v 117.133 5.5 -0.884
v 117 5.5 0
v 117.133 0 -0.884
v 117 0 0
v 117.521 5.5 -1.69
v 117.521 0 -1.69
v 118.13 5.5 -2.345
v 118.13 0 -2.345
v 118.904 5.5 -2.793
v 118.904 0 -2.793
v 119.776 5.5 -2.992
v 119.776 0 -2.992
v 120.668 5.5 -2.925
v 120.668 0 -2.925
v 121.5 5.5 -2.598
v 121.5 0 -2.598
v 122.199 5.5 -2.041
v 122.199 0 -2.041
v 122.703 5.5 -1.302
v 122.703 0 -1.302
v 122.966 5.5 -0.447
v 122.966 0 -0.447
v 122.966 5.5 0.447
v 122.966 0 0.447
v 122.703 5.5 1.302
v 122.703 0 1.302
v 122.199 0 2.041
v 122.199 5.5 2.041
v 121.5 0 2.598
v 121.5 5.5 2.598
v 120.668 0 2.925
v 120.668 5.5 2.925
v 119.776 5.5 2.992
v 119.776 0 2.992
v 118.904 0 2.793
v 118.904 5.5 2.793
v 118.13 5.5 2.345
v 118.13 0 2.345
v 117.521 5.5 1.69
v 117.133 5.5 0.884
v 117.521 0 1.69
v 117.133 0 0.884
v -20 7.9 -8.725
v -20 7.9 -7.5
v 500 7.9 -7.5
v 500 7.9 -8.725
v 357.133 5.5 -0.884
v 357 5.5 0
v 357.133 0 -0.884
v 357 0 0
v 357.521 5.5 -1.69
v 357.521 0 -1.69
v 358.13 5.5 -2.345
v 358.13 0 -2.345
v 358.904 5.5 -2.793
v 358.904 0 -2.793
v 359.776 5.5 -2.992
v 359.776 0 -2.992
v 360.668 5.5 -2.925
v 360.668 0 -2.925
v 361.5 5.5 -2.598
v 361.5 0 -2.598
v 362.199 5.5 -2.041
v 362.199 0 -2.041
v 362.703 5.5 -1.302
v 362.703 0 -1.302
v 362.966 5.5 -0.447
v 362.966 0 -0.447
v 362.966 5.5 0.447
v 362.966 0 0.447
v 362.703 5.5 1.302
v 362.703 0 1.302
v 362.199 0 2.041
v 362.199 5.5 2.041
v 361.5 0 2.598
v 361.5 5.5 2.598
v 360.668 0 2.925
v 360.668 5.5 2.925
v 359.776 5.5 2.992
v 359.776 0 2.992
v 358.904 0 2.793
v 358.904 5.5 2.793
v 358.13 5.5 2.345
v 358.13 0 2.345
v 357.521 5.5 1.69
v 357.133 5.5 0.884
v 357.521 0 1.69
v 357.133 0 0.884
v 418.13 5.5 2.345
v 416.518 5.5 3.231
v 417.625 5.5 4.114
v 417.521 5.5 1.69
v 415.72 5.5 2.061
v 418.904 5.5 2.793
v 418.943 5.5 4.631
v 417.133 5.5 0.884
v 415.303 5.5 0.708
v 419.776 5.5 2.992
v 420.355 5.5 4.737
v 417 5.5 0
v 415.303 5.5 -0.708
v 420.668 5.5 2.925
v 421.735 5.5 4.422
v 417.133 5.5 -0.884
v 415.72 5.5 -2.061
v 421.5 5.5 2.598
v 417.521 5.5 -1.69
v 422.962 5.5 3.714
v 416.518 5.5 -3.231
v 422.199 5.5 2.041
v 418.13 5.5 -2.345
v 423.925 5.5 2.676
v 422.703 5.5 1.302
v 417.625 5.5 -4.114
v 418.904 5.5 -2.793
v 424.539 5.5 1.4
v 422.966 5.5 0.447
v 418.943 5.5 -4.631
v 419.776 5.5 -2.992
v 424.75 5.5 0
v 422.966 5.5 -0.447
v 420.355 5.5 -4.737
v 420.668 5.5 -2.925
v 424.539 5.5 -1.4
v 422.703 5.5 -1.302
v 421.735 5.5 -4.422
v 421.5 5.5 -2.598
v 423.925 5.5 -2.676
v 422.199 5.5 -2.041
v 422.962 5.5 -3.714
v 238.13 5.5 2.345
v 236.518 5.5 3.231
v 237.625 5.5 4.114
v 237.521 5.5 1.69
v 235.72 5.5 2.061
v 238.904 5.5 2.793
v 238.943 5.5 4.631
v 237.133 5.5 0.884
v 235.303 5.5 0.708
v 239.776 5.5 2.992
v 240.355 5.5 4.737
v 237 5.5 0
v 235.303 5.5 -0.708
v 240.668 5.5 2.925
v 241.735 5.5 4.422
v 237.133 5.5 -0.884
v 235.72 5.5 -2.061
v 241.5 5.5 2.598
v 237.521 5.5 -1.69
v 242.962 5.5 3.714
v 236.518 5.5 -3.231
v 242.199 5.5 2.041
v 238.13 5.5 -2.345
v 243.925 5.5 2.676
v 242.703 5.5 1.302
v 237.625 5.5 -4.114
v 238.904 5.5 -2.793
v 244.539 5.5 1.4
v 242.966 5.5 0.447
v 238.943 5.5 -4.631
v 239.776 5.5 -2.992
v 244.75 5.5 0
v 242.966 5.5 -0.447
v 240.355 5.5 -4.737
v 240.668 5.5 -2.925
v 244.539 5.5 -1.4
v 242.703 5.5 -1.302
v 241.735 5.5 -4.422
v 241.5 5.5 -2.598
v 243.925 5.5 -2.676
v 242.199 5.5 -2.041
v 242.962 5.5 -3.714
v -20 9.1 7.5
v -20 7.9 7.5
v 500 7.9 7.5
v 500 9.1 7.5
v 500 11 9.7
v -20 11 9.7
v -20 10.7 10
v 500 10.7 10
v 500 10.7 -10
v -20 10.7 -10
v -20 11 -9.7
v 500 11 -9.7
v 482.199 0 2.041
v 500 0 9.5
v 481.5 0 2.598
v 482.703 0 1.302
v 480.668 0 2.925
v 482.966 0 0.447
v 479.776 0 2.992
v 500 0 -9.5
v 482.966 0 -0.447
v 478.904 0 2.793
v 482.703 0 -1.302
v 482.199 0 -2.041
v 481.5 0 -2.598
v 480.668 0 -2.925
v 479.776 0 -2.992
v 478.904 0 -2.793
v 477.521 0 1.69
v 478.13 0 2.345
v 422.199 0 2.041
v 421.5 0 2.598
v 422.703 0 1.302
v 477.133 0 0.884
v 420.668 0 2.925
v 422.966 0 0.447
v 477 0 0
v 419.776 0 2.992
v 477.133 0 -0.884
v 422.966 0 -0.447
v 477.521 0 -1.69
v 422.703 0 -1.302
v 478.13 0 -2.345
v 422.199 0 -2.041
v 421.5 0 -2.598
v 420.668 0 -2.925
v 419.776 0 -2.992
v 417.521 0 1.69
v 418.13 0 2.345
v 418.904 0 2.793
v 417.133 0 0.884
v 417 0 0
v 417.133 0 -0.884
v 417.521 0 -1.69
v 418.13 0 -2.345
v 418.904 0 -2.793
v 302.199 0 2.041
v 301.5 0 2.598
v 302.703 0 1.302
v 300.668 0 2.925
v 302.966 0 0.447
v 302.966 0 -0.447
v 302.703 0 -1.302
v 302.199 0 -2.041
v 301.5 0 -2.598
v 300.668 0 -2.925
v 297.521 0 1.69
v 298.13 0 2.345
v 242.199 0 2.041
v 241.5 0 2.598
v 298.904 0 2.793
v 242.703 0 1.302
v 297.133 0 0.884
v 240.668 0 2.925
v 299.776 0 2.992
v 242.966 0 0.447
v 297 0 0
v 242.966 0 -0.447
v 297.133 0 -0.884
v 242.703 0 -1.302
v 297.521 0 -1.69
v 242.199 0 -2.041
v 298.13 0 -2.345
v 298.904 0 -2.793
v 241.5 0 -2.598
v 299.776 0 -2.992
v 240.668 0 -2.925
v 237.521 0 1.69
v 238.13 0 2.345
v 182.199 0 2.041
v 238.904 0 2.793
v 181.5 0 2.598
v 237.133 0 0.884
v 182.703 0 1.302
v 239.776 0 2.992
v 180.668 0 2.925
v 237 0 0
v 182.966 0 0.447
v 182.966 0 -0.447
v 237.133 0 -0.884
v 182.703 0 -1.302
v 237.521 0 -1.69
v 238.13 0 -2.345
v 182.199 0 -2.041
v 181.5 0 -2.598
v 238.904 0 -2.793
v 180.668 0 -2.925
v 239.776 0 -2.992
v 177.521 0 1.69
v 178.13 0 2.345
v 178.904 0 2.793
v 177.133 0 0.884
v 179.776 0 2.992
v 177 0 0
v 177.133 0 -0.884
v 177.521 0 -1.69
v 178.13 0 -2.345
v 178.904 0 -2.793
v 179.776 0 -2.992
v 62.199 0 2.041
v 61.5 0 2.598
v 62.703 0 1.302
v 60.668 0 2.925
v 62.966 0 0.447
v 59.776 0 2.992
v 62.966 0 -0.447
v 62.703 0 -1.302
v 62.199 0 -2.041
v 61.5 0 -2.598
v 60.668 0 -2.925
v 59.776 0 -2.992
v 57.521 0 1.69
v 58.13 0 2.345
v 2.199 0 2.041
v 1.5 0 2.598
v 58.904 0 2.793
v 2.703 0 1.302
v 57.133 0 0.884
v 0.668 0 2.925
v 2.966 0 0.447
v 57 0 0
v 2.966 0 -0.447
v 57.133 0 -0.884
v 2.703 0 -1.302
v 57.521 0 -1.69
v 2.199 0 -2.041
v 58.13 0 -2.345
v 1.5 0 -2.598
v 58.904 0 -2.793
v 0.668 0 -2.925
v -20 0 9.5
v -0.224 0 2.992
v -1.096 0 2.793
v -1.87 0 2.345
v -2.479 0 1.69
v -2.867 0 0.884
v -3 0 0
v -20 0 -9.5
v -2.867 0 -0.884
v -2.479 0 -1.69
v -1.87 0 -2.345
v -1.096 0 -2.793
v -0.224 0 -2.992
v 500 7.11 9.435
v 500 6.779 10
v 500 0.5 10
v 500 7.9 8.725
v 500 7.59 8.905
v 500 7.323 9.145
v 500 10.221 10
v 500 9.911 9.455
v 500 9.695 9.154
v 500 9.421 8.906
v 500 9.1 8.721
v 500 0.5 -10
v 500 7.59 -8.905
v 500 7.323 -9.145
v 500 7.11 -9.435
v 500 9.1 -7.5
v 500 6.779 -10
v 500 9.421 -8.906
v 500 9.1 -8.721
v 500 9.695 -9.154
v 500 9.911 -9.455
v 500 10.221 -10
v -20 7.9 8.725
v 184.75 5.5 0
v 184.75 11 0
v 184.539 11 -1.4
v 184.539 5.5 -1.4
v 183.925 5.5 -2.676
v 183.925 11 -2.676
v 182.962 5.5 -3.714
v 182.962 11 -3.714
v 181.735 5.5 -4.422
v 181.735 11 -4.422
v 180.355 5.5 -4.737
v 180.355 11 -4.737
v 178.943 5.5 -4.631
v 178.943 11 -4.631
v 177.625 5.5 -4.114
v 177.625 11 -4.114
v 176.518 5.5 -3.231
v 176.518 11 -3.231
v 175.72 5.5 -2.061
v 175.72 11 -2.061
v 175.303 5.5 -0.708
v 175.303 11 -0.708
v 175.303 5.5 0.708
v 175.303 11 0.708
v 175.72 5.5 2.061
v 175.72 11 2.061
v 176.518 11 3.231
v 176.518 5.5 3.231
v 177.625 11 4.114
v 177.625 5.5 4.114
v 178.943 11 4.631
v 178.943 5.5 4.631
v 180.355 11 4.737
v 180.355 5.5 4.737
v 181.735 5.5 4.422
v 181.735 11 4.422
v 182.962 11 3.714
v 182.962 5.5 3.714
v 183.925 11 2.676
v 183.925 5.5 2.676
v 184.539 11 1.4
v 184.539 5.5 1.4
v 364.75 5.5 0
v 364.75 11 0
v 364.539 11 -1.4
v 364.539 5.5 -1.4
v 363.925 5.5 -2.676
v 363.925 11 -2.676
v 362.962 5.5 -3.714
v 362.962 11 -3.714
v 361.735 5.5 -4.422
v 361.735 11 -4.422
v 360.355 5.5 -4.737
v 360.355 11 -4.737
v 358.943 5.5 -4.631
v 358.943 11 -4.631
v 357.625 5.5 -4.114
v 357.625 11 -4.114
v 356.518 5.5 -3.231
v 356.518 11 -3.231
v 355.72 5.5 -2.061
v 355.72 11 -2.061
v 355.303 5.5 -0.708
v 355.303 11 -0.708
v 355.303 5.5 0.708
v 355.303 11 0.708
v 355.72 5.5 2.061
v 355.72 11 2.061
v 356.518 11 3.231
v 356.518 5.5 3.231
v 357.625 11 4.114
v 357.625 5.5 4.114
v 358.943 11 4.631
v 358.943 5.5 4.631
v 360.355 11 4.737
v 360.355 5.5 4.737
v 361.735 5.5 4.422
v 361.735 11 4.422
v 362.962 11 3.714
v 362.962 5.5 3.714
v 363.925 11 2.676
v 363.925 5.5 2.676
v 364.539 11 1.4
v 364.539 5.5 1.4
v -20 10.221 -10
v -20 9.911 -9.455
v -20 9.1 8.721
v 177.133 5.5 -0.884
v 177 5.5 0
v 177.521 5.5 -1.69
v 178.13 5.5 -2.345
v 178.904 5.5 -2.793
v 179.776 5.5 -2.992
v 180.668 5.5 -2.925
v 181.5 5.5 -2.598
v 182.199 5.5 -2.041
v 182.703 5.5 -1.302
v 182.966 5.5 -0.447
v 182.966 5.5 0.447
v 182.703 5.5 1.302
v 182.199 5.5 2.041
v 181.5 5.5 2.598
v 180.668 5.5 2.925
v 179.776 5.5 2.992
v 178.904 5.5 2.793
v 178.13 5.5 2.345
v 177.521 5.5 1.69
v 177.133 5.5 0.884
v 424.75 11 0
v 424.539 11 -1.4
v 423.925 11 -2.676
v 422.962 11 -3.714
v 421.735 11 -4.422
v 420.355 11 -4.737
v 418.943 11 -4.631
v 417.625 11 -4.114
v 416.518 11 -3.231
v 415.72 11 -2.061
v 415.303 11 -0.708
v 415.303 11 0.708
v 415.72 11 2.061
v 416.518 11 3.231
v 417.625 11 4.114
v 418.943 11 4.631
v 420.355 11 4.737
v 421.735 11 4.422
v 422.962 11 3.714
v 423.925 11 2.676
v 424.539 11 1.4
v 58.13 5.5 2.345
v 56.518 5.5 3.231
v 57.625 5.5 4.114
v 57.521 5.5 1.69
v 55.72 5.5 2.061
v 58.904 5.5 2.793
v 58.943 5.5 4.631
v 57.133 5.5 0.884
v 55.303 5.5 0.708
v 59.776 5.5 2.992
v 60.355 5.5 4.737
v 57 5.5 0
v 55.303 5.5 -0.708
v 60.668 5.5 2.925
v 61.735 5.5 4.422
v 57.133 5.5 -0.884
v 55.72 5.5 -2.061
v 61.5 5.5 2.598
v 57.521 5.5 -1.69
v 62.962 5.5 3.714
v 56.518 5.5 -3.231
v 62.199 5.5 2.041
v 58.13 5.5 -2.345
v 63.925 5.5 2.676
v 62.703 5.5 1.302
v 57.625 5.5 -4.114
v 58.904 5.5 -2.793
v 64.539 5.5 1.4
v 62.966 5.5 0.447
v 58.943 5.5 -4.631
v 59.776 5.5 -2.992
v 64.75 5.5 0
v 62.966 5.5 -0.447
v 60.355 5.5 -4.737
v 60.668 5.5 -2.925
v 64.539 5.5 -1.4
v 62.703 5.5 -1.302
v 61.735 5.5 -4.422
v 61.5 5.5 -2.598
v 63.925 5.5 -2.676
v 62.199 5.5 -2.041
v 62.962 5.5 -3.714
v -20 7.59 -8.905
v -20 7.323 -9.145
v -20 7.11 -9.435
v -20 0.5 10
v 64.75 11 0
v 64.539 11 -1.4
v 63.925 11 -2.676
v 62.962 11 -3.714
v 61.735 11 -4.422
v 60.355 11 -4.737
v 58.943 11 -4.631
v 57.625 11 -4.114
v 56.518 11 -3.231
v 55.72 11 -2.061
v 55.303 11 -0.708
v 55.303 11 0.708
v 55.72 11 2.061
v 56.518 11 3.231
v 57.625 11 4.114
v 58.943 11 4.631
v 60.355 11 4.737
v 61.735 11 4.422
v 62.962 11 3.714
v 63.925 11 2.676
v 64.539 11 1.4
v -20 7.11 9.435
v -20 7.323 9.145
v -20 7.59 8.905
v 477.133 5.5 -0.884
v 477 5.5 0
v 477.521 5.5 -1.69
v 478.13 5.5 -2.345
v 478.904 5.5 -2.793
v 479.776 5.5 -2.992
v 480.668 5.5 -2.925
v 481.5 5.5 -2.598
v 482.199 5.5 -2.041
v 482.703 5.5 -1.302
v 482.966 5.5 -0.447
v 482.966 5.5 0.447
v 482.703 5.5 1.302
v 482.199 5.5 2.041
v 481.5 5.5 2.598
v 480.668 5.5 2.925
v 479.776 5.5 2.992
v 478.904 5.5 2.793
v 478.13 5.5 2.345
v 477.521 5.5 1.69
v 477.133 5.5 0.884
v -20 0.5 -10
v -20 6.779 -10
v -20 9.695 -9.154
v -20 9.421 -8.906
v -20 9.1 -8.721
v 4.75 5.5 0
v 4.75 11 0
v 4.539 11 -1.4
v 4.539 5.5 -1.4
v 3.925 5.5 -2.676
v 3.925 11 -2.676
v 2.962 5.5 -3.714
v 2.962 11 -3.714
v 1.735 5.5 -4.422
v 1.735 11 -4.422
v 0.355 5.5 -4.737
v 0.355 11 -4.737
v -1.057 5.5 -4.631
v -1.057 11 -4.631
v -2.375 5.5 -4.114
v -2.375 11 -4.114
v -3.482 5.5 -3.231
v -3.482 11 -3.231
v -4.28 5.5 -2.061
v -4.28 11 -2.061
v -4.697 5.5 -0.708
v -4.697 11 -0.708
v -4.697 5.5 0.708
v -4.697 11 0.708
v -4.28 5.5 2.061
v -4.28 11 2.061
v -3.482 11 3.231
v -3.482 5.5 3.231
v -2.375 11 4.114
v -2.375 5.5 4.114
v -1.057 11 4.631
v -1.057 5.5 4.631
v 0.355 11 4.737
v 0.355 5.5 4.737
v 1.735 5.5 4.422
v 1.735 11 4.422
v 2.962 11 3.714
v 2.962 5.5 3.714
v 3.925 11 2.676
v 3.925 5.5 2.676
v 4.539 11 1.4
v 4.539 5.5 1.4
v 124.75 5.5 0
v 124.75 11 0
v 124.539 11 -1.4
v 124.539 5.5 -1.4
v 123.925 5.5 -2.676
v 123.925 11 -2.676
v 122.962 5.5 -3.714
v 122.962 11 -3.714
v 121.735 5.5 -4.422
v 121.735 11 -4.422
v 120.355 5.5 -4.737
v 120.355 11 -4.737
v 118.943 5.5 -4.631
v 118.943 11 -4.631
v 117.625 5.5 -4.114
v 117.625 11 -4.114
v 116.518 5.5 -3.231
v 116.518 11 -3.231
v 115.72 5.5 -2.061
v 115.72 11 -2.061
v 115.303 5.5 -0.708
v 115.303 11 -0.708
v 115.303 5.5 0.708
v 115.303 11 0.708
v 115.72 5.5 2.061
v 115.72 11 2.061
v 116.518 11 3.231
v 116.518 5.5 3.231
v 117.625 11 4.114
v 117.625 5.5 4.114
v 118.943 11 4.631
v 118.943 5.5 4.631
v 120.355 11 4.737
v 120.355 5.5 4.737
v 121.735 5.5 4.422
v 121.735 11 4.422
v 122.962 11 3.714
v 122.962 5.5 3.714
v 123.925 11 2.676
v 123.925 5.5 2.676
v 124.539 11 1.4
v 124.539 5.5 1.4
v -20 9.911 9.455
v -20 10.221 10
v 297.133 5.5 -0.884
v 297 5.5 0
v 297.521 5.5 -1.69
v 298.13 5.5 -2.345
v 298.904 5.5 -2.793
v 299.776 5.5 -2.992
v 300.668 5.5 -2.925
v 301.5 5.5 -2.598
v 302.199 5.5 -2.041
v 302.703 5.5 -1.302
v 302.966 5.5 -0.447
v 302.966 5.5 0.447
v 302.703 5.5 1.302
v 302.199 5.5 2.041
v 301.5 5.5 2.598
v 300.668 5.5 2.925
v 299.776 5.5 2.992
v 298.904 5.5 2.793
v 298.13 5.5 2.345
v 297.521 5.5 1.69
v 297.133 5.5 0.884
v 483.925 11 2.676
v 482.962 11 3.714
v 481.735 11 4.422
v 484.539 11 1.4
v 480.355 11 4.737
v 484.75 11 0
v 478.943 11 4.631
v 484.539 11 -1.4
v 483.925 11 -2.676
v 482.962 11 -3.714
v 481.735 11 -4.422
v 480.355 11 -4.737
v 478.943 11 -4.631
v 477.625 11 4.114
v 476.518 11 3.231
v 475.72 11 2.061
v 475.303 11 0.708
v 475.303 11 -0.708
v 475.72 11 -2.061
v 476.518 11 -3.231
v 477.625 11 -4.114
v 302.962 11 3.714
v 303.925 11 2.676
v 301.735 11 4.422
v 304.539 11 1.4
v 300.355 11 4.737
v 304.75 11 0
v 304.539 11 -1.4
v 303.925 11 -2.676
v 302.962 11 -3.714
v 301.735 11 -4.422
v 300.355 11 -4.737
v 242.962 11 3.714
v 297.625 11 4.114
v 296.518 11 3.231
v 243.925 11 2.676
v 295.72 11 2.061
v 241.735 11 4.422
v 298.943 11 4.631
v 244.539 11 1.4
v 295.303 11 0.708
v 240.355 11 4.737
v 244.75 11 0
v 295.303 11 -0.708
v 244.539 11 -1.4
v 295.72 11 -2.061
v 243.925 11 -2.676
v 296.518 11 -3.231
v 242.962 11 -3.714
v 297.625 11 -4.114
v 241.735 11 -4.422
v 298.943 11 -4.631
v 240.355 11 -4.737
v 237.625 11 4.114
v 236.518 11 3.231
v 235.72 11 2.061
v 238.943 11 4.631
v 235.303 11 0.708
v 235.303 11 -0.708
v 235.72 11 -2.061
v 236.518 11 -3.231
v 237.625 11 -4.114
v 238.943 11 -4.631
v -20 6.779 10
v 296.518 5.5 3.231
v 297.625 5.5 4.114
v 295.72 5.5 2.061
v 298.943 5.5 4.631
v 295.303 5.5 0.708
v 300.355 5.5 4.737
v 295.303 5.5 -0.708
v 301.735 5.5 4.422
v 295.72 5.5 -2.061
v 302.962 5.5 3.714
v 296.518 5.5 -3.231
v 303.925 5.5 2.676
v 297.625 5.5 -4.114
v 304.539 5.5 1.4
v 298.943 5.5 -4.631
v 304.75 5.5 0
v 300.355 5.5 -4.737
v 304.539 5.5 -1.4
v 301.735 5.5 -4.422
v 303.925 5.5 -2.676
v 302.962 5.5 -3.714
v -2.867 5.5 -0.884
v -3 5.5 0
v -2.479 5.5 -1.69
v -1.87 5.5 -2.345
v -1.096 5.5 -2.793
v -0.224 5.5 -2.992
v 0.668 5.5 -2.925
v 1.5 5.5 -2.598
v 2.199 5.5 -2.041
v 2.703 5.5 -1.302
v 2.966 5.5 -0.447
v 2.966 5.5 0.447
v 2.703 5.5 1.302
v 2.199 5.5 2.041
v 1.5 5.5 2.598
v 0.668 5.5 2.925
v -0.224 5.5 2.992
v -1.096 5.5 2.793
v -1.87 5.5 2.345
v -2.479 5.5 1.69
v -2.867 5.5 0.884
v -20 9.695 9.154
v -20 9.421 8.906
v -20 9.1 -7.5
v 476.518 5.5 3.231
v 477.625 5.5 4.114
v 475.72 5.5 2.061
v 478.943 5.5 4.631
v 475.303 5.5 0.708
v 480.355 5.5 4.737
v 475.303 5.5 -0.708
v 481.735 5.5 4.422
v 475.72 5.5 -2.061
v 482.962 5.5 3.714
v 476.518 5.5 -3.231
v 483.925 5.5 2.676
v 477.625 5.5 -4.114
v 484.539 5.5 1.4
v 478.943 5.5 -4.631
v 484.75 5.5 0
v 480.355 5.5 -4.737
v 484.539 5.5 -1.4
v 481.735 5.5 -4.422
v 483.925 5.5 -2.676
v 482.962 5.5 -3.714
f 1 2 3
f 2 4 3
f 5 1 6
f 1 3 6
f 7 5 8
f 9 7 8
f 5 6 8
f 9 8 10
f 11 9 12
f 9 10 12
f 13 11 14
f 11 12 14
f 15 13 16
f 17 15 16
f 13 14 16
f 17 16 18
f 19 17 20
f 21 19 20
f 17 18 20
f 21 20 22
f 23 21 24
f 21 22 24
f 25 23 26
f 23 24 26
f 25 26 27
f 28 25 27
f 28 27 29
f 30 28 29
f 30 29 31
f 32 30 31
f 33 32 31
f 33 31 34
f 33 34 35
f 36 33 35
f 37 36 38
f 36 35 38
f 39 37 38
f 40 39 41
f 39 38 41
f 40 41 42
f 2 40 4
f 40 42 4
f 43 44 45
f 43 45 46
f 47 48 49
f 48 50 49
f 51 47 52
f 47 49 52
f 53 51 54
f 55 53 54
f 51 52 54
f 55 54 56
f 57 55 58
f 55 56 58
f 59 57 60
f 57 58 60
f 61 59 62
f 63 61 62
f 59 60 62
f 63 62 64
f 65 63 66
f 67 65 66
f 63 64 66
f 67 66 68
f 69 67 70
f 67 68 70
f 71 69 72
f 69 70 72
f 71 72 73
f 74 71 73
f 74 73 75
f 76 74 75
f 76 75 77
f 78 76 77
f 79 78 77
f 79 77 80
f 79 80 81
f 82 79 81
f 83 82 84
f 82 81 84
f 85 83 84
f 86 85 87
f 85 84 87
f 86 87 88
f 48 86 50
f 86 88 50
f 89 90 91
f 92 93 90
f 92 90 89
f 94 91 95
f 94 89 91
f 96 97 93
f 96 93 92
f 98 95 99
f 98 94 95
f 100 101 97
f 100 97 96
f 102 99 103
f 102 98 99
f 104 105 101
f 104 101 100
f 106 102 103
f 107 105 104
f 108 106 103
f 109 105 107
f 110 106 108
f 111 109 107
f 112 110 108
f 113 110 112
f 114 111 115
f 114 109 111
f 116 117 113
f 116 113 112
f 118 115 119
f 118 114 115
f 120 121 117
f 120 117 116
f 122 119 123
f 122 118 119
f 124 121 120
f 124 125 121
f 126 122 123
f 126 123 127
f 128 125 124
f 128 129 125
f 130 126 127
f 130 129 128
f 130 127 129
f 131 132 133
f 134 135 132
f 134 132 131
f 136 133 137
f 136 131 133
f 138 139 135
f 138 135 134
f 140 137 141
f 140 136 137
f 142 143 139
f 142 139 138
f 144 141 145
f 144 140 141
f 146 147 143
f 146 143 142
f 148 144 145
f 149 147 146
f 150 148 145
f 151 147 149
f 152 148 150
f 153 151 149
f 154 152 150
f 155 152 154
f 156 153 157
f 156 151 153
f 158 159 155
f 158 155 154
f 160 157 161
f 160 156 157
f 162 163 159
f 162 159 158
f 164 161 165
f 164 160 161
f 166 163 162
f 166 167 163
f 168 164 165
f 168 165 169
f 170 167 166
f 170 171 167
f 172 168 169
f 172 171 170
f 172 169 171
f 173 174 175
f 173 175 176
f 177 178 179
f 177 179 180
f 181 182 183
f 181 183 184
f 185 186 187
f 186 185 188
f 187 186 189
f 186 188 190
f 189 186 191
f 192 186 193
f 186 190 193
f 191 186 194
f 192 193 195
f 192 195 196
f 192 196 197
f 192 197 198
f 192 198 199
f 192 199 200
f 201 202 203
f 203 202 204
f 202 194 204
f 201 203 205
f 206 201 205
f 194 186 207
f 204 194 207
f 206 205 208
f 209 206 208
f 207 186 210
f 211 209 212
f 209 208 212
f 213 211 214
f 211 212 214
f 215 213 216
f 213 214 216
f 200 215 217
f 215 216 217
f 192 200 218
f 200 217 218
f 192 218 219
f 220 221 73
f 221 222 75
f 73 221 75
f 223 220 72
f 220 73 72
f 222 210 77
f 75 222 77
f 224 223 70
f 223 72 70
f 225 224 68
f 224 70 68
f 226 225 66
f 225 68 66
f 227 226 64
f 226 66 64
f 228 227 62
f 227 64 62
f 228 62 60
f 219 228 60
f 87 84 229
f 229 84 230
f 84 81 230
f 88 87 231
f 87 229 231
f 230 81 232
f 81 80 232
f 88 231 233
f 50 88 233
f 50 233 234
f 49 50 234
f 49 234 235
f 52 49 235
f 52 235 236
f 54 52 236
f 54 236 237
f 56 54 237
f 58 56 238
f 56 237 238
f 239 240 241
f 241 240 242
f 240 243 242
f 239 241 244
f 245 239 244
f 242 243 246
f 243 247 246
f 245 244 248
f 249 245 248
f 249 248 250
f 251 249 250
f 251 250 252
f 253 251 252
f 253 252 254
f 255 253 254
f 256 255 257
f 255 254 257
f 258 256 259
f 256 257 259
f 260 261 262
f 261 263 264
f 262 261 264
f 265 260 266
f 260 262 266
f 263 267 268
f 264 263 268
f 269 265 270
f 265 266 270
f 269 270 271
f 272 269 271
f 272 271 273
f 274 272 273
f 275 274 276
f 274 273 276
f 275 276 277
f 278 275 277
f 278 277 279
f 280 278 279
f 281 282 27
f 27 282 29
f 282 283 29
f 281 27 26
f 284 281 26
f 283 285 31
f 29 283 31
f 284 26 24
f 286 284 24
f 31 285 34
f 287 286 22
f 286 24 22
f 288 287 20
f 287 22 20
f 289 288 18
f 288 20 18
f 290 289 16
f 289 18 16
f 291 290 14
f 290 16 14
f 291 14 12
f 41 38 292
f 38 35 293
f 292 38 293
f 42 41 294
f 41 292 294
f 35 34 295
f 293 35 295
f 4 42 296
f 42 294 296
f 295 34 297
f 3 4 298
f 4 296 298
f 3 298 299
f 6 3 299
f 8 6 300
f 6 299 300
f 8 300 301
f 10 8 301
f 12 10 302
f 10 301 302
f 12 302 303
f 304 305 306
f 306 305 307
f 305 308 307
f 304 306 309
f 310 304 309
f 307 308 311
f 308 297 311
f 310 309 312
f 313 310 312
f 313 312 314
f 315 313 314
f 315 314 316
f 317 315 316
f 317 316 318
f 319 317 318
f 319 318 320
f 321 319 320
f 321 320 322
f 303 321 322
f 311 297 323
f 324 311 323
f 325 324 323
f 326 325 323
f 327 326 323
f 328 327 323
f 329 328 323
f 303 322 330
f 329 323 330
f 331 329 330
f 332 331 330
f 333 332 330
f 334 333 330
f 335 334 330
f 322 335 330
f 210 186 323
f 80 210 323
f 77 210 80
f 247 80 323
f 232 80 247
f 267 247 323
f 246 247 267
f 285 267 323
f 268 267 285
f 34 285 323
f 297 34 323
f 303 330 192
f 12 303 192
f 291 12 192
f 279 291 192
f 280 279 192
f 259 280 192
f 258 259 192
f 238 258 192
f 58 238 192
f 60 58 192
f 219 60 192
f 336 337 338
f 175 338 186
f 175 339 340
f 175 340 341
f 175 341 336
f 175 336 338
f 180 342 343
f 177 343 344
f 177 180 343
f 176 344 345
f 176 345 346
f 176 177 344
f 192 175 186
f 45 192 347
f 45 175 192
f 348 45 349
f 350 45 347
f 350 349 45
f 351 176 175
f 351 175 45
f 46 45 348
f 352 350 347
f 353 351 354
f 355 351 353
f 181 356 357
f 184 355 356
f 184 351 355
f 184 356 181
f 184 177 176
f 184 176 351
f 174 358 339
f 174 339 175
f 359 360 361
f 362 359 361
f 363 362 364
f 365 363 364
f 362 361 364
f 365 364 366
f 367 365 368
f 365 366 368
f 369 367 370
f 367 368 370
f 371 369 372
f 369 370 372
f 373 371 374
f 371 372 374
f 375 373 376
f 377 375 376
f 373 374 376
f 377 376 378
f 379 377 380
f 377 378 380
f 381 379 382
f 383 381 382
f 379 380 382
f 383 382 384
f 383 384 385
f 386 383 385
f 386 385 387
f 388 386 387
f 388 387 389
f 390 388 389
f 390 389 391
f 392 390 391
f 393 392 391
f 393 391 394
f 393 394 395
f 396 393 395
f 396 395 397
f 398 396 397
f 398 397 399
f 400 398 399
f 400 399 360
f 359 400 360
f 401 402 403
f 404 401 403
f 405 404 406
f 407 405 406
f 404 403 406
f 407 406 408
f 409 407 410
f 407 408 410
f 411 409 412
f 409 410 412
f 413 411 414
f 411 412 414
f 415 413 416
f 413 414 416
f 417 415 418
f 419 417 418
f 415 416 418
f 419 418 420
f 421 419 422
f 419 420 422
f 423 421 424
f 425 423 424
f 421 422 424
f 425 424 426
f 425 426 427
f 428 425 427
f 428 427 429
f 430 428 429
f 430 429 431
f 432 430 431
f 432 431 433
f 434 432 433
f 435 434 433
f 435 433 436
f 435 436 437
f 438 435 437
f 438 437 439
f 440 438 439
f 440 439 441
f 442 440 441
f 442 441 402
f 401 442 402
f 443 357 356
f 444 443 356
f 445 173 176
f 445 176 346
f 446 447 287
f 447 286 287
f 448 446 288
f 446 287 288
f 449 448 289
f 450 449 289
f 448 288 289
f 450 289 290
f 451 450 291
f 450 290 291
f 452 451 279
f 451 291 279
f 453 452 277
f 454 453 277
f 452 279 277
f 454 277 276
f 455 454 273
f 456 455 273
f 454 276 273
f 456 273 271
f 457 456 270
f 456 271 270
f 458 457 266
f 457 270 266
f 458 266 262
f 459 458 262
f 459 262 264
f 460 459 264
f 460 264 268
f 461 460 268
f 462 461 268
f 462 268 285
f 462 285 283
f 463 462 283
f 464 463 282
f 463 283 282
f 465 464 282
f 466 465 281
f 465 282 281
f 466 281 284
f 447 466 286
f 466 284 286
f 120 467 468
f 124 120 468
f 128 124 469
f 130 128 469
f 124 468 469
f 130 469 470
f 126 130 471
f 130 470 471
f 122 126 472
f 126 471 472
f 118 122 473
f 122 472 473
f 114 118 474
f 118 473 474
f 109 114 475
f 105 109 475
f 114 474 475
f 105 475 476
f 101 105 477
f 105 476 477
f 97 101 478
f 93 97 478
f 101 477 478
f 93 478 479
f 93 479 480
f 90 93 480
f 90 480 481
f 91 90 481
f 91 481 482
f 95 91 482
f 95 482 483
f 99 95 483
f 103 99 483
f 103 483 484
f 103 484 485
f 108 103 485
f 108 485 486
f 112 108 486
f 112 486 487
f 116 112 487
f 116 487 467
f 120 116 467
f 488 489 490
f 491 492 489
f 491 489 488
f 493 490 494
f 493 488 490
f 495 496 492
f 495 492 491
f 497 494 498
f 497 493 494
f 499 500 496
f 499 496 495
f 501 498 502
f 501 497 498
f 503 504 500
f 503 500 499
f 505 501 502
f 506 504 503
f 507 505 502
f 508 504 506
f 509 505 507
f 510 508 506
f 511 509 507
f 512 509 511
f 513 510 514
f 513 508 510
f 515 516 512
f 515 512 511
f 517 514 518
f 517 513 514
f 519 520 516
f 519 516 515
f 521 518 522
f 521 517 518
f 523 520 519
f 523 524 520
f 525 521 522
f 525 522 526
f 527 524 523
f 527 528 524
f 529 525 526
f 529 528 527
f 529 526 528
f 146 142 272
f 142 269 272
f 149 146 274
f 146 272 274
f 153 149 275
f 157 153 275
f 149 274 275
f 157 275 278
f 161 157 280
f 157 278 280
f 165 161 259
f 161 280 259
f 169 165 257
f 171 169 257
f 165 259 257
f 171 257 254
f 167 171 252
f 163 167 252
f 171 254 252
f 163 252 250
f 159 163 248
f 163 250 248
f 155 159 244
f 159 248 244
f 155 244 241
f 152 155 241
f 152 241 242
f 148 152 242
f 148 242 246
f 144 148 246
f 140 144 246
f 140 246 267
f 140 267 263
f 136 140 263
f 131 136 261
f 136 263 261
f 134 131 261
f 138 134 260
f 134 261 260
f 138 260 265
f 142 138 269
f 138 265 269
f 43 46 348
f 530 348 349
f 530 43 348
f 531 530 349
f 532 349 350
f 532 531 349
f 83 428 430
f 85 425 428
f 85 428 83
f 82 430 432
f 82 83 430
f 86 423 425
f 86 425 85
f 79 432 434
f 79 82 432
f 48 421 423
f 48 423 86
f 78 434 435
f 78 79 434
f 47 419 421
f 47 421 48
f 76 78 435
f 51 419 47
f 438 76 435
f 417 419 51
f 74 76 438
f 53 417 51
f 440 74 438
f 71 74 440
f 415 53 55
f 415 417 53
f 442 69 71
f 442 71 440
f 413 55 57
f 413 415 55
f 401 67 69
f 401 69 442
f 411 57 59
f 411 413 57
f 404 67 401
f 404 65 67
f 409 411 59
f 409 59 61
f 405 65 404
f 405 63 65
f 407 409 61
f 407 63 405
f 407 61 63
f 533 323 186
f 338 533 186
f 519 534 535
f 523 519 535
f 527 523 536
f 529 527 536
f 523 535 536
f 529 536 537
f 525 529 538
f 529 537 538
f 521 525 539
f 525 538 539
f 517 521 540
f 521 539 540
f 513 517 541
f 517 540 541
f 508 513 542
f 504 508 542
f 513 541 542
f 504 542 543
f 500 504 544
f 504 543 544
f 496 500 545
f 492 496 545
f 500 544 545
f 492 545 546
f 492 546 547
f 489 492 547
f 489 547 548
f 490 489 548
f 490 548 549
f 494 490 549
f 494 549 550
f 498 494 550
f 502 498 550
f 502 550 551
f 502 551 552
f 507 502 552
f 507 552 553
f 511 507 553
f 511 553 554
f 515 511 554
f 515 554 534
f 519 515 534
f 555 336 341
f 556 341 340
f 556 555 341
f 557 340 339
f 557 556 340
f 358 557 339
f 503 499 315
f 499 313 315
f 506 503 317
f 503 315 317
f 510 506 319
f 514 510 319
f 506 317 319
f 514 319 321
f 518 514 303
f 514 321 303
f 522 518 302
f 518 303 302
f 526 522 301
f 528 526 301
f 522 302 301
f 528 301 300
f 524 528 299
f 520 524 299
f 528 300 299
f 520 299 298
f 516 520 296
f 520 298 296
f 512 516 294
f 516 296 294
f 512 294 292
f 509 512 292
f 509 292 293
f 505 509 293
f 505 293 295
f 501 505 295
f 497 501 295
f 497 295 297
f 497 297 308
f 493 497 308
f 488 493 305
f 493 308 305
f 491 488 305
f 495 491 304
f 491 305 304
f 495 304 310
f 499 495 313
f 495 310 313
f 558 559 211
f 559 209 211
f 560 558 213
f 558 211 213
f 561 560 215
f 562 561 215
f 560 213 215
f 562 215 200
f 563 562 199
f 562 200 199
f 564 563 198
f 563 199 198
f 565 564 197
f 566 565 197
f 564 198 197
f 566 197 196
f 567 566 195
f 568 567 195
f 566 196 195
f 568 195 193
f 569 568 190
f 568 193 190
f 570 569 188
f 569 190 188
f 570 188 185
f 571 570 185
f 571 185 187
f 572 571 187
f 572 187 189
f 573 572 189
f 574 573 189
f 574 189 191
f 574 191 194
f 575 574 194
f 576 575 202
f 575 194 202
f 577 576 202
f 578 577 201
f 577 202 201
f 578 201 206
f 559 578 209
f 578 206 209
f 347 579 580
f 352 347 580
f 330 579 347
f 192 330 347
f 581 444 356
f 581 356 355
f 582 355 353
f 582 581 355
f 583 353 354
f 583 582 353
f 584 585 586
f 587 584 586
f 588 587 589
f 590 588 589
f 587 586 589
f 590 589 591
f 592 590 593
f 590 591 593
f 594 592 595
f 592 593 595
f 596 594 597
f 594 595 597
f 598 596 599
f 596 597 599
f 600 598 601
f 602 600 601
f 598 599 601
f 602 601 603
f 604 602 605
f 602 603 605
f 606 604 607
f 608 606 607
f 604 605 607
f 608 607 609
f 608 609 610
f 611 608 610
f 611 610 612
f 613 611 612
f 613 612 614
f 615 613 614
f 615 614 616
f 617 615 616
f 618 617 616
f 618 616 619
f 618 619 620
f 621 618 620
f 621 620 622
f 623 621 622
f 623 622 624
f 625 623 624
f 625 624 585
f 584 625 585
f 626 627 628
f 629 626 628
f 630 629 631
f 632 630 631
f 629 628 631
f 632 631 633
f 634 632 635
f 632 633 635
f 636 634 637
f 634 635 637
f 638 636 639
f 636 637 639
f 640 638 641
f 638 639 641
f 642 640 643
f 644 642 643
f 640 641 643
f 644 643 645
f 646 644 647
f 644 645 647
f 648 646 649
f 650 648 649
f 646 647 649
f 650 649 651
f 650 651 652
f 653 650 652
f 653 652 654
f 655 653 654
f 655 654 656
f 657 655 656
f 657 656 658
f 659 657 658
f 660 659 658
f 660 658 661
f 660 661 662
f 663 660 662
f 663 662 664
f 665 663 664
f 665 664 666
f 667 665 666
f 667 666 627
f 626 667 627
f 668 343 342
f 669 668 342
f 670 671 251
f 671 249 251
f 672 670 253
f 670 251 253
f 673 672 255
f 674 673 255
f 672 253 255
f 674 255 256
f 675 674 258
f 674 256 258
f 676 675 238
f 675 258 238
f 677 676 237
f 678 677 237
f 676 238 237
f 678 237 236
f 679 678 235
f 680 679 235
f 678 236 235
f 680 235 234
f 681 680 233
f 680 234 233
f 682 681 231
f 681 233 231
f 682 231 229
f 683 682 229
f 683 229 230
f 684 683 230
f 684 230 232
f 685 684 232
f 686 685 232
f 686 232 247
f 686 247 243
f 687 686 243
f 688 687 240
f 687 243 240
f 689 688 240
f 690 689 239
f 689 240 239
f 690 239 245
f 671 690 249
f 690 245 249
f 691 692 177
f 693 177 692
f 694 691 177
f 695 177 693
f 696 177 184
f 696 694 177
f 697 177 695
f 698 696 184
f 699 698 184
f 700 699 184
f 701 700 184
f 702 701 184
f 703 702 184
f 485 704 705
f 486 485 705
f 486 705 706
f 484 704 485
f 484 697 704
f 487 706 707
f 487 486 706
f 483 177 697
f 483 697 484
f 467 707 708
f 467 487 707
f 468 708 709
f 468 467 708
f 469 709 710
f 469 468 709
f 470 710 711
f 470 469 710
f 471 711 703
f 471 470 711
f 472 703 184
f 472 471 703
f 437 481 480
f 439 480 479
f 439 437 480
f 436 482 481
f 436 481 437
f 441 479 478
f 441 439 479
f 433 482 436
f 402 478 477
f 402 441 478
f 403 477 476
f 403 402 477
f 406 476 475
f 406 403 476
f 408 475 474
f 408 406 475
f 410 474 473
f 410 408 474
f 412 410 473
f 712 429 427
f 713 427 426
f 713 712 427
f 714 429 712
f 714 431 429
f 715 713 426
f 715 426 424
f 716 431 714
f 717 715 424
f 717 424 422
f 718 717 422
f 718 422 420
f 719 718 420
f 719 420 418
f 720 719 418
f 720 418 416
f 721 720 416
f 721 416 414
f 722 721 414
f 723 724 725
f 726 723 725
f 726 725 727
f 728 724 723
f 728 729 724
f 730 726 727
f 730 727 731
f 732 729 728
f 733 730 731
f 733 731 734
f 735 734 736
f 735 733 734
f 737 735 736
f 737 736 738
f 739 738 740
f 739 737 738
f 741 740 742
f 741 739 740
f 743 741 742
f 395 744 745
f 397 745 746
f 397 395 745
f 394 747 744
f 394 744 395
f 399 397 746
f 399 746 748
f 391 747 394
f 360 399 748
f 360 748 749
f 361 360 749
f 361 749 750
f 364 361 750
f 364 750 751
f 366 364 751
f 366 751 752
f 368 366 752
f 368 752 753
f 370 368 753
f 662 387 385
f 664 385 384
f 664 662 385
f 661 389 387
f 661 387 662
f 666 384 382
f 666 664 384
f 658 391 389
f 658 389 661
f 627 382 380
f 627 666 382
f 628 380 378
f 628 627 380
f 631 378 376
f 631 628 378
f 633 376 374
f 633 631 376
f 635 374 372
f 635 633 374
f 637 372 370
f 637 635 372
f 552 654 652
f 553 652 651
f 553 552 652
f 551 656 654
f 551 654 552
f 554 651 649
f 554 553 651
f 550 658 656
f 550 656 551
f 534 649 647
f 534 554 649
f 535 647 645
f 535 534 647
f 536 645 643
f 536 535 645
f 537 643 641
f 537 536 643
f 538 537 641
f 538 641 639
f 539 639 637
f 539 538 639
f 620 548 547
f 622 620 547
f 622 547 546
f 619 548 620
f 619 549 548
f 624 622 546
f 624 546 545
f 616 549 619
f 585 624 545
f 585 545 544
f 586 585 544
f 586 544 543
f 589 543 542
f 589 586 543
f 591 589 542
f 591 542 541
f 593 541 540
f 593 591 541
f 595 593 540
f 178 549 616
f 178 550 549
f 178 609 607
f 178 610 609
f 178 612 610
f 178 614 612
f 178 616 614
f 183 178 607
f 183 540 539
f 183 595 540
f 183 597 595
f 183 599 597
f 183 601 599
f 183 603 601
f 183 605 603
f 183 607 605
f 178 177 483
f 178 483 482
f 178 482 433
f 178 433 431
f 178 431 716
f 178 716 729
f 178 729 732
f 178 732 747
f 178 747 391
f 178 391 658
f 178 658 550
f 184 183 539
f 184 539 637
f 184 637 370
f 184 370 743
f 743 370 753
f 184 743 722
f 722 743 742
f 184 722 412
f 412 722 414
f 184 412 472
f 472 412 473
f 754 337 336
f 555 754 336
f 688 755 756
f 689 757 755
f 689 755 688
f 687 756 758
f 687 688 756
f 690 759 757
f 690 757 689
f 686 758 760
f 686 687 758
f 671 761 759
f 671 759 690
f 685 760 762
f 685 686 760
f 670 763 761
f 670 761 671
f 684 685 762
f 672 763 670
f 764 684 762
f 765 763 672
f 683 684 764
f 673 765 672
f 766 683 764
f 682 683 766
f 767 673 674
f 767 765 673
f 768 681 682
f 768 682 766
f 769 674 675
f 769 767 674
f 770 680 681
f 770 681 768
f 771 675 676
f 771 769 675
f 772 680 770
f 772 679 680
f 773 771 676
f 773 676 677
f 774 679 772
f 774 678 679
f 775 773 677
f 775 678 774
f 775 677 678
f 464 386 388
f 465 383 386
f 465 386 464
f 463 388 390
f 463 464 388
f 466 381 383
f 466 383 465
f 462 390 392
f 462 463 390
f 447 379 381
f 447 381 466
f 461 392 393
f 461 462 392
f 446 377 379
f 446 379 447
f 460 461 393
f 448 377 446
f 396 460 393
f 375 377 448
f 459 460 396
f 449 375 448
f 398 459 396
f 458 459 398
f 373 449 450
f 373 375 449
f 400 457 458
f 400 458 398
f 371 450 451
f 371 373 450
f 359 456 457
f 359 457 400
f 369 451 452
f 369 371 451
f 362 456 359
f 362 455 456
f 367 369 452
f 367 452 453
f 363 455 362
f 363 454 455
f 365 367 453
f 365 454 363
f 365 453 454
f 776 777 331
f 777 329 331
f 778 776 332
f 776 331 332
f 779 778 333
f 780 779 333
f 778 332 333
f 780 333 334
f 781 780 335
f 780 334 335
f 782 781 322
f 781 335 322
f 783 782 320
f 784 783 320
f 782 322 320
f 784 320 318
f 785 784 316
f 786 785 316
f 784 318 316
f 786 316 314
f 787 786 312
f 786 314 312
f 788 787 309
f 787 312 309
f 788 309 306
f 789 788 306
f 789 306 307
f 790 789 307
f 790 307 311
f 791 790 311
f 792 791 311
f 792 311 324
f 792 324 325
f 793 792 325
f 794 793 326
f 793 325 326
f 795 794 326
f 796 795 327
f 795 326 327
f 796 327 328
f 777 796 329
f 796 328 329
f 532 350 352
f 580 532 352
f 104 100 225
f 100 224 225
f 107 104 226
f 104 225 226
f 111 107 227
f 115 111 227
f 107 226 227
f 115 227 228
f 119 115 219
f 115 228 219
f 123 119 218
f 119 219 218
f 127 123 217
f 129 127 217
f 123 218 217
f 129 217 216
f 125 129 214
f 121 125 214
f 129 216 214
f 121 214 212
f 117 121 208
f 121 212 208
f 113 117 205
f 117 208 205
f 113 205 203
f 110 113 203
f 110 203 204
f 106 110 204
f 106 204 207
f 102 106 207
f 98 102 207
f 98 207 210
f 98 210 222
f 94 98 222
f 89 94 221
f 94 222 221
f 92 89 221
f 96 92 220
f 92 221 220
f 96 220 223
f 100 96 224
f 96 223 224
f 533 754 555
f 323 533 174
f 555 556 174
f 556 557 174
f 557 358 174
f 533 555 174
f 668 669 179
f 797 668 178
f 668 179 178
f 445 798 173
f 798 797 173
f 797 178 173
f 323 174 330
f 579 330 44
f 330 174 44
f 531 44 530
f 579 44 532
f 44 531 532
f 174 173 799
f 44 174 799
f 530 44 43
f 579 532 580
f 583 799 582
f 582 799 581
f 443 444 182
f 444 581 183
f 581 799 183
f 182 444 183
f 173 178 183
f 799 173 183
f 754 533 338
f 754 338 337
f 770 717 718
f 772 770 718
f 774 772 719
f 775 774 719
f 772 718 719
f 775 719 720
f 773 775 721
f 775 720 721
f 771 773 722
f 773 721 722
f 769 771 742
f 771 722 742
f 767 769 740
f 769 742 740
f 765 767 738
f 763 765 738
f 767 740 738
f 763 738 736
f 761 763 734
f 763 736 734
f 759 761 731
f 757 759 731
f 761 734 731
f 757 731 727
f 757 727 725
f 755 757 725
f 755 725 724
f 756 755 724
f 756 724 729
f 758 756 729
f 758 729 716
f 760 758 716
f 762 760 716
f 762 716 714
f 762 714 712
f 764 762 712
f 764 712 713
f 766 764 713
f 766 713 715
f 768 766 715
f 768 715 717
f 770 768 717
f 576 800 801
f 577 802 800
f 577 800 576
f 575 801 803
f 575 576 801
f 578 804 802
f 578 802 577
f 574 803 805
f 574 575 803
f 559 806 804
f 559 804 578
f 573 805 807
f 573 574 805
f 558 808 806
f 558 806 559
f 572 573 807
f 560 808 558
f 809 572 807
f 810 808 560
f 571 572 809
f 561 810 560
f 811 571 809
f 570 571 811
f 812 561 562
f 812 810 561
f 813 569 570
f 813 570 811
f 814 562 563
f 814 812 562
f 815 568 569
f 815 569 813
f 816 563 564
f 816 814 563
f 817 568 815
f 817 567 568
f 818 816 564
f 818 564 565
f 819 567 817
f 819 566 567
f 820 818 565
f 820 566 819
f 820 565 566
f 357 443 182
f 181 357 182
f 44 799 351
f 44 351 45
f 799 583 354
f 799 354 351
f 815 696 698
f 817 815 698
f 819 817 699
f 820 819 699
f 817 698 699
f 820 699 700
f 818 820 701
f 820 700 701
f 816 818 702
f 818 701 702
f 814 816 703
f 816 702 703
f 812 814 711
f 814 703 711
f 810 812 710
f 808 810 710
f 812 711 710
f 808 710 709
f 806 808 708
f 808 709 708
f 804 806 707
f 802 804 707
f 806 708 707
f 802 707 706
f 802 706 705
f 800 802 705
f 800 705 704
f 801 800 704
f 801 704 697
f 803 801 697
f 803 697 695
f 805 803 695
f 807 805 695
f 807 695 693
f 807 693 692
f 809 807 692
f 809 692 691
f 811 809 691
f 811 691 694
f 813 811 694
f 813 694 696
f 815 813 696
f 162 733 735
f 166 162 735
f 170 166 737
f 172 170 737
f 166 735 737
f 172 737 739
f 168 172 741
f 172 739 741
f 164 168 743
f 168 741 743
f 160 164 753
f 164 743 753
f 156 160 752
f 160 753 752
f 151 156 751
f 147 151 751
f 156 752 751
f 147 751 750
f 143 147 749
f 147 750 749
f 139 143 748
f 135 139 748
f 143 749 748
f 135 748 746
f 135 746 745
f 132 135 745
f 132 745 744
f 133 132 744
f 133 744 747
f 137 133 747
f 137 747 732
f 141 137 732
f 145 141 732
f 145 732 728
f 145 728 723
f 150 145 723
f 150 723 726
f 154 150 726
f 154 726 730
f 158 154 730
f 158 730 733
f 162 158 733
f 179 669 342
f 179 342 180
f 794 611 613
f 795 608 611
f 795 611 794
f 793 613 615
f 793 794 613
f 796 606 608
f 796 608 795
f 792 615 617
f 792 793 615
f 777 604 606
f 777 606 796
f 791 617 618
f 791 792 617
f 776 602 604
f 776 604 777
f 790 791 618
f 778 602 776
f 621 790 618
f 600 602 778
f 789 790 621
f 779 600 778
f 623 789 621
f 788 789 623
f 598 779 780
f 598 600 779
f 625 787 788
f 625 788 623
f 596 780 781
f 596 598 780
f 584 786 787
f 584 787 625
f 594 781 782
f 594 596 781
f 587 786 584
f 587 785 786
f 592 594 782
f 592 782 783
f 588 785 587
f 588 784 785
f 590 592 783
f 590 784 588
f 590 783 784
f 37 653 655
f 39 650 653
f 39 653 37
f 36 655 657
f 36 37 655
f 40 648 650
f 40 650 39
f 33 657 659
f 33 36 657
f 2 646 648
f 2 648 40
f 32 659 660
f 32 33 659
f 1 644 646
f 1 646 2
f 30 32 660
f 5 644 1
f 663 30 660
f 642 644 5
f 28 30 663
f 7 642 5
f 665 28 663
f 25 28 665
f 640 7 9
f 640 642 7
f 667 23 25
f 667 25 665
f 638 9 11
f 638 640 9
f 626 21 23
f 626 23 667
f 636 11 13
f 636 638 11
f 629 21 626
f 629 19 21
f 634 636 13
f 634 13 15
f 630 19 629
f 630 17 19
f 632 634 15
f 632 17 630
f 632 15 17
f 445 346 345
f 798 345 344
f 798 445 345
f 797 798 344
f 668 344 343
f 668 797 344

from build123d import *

# Parameters (mm, degrees)
SKETCH1_W                                    = 20
SKETCH1_H                                    = 11
BOSS_EXTRUDE1_DEPTH                          = 520
CUT_EXTRUDE1_DEPTH                           = 521
CBORE_FOR_SOCKET_HEAD_CAP_SCREW1_D           = 6
CBORE_FOR_SOCKET_HEAD_CAP_SCREW1_CBORE_D     = 9.5
CBORE_FOR_SOCKET_HEAD_CAP_SCREW1_CBORE_DEPTH = 5.5
LPATTERN1_COUNT                              = 9
LPATTERN1_PITCH                              = 60
CHAMFER1_SIZE                                = 0.3
CHAMFER2_SIZE                                = 0.5


with BuildPart() as part:
    # Sketch1 → Boss-Extrude1 (new body)
    with BuildSketch(Plane(origin=(-20, 0, 0), x_dir=(0, 0, -1), z_dir=(1, 0, 0))):
        with Locations((0, 5.5)):
            Rectangle(SKETCH1_W, SKETCH1_H)
    extrude(amount=BOSS_EXTRUDE1_DEPTH)

    # Sketch2 → Cut-Extrude1 (cut, through all)
    with BuildSketch(Plane(origin=(-20, 0, 0), x_dir=(0, 0, -1), z_dir=(1, 0, 0))):
        with BuildLine():
            Line((10, 10.221039482), (9.455259378, 9.911421591))
            ThreePointArc((9.455259378, 9.911421591), (9.0228024, 9.564639684), (8.720500078, 9.1))
            Line((8.720500078, 9.1), (7.5, 9.1))
            Line((7.5, 9.1), (7.5, 7.9))
            Line((7.5, 7.9), (8.724976489, 7.9))
            ThreePointArc((8.724976489, 7.9), (9.018551739, 7.450071616), (9.434780564, 7.110401858))
            Line((9.434780564, 7.110401858), (10, 6.778960518))
            Line((10, 6.778960518), (10, 10.221039482))
        make_face()
        with BuildLine():
            Line((-10, 10.221039482), (-10, 6.778960518))
            Line((-10, 6.778960518), (-9.434780564, 7.110401858))
            ThreePointArc((-9.434780564, 7.110401858), (-9.018551739, 7.450071616), (-8.724976489, 7.9))
            Line((-8.724976489, 7.9), (-7.5, 7.9))
            Line((-7.5, 7.9), (-7.5, 9.1))
            Line((-7.5, 9.1), (-8.720500078, 9.1))
            ThreePointArc((-8.720500078, 9.1), (-9.0228024, 9.564639684), (-9.455259378, 9.911421591))
            Line((-9.455259378, 9.911421591), (-10, 10.221039482))
        make_face()
    extrude(amount=CUT_EXTRUDE1_DEPTH, mode=Mode.SUBTRACT)

    # CBORE for Socket Head Cap Screw1 (through all)
    with Locations(Plane(origin=(0, 11, 0), x_dir=(1, 0, 0), z_dir=(0, 1, 0))):
        with Locations((0, 0)):
            cbore_for_socket_head_cap_screw1 = CounterBoreHole(CBORE_FOR_SOCKET_HEAD_CAP_SCREW1_D / 2, CBORE_FOR_SOCKET_HEAD_CAP_SCREW1_CBORE_D / 2, CBORE_FOR_SOCKET_HEAD_CAP_SCREW1_CBORE_DEPTH)

    # LPattern1: CBORE for Socket Head Cap Screw1 ×9
    with Locations(*[(i * LPATTERN1_PITCH, 0, 0) for i in range(1, LPATTERN1_COUNT)]):
        add(cbore_for_socket_head_cap_screw1, mode=Mode.SUBTRACT)

    # Chamfer1
    chamfer1_edges = [part.edges().sort_by_distance(p)[0] for p in [
        (240, 11, 10),
        (240, 11, -10),
    ]]
    chamfer(chamfer1_edges, length=CHAMFER1_SIZE)

    # Chamfer2
    chamfer2_edges = [part.edges().sort_by_distance(p)[0] for p in [
        (240, 0, -10),
        (240, 0, 10),
    ]]
    chamfer(chamfer2_edges, length=CHAMFER2_SIZE)


solid = part.part
